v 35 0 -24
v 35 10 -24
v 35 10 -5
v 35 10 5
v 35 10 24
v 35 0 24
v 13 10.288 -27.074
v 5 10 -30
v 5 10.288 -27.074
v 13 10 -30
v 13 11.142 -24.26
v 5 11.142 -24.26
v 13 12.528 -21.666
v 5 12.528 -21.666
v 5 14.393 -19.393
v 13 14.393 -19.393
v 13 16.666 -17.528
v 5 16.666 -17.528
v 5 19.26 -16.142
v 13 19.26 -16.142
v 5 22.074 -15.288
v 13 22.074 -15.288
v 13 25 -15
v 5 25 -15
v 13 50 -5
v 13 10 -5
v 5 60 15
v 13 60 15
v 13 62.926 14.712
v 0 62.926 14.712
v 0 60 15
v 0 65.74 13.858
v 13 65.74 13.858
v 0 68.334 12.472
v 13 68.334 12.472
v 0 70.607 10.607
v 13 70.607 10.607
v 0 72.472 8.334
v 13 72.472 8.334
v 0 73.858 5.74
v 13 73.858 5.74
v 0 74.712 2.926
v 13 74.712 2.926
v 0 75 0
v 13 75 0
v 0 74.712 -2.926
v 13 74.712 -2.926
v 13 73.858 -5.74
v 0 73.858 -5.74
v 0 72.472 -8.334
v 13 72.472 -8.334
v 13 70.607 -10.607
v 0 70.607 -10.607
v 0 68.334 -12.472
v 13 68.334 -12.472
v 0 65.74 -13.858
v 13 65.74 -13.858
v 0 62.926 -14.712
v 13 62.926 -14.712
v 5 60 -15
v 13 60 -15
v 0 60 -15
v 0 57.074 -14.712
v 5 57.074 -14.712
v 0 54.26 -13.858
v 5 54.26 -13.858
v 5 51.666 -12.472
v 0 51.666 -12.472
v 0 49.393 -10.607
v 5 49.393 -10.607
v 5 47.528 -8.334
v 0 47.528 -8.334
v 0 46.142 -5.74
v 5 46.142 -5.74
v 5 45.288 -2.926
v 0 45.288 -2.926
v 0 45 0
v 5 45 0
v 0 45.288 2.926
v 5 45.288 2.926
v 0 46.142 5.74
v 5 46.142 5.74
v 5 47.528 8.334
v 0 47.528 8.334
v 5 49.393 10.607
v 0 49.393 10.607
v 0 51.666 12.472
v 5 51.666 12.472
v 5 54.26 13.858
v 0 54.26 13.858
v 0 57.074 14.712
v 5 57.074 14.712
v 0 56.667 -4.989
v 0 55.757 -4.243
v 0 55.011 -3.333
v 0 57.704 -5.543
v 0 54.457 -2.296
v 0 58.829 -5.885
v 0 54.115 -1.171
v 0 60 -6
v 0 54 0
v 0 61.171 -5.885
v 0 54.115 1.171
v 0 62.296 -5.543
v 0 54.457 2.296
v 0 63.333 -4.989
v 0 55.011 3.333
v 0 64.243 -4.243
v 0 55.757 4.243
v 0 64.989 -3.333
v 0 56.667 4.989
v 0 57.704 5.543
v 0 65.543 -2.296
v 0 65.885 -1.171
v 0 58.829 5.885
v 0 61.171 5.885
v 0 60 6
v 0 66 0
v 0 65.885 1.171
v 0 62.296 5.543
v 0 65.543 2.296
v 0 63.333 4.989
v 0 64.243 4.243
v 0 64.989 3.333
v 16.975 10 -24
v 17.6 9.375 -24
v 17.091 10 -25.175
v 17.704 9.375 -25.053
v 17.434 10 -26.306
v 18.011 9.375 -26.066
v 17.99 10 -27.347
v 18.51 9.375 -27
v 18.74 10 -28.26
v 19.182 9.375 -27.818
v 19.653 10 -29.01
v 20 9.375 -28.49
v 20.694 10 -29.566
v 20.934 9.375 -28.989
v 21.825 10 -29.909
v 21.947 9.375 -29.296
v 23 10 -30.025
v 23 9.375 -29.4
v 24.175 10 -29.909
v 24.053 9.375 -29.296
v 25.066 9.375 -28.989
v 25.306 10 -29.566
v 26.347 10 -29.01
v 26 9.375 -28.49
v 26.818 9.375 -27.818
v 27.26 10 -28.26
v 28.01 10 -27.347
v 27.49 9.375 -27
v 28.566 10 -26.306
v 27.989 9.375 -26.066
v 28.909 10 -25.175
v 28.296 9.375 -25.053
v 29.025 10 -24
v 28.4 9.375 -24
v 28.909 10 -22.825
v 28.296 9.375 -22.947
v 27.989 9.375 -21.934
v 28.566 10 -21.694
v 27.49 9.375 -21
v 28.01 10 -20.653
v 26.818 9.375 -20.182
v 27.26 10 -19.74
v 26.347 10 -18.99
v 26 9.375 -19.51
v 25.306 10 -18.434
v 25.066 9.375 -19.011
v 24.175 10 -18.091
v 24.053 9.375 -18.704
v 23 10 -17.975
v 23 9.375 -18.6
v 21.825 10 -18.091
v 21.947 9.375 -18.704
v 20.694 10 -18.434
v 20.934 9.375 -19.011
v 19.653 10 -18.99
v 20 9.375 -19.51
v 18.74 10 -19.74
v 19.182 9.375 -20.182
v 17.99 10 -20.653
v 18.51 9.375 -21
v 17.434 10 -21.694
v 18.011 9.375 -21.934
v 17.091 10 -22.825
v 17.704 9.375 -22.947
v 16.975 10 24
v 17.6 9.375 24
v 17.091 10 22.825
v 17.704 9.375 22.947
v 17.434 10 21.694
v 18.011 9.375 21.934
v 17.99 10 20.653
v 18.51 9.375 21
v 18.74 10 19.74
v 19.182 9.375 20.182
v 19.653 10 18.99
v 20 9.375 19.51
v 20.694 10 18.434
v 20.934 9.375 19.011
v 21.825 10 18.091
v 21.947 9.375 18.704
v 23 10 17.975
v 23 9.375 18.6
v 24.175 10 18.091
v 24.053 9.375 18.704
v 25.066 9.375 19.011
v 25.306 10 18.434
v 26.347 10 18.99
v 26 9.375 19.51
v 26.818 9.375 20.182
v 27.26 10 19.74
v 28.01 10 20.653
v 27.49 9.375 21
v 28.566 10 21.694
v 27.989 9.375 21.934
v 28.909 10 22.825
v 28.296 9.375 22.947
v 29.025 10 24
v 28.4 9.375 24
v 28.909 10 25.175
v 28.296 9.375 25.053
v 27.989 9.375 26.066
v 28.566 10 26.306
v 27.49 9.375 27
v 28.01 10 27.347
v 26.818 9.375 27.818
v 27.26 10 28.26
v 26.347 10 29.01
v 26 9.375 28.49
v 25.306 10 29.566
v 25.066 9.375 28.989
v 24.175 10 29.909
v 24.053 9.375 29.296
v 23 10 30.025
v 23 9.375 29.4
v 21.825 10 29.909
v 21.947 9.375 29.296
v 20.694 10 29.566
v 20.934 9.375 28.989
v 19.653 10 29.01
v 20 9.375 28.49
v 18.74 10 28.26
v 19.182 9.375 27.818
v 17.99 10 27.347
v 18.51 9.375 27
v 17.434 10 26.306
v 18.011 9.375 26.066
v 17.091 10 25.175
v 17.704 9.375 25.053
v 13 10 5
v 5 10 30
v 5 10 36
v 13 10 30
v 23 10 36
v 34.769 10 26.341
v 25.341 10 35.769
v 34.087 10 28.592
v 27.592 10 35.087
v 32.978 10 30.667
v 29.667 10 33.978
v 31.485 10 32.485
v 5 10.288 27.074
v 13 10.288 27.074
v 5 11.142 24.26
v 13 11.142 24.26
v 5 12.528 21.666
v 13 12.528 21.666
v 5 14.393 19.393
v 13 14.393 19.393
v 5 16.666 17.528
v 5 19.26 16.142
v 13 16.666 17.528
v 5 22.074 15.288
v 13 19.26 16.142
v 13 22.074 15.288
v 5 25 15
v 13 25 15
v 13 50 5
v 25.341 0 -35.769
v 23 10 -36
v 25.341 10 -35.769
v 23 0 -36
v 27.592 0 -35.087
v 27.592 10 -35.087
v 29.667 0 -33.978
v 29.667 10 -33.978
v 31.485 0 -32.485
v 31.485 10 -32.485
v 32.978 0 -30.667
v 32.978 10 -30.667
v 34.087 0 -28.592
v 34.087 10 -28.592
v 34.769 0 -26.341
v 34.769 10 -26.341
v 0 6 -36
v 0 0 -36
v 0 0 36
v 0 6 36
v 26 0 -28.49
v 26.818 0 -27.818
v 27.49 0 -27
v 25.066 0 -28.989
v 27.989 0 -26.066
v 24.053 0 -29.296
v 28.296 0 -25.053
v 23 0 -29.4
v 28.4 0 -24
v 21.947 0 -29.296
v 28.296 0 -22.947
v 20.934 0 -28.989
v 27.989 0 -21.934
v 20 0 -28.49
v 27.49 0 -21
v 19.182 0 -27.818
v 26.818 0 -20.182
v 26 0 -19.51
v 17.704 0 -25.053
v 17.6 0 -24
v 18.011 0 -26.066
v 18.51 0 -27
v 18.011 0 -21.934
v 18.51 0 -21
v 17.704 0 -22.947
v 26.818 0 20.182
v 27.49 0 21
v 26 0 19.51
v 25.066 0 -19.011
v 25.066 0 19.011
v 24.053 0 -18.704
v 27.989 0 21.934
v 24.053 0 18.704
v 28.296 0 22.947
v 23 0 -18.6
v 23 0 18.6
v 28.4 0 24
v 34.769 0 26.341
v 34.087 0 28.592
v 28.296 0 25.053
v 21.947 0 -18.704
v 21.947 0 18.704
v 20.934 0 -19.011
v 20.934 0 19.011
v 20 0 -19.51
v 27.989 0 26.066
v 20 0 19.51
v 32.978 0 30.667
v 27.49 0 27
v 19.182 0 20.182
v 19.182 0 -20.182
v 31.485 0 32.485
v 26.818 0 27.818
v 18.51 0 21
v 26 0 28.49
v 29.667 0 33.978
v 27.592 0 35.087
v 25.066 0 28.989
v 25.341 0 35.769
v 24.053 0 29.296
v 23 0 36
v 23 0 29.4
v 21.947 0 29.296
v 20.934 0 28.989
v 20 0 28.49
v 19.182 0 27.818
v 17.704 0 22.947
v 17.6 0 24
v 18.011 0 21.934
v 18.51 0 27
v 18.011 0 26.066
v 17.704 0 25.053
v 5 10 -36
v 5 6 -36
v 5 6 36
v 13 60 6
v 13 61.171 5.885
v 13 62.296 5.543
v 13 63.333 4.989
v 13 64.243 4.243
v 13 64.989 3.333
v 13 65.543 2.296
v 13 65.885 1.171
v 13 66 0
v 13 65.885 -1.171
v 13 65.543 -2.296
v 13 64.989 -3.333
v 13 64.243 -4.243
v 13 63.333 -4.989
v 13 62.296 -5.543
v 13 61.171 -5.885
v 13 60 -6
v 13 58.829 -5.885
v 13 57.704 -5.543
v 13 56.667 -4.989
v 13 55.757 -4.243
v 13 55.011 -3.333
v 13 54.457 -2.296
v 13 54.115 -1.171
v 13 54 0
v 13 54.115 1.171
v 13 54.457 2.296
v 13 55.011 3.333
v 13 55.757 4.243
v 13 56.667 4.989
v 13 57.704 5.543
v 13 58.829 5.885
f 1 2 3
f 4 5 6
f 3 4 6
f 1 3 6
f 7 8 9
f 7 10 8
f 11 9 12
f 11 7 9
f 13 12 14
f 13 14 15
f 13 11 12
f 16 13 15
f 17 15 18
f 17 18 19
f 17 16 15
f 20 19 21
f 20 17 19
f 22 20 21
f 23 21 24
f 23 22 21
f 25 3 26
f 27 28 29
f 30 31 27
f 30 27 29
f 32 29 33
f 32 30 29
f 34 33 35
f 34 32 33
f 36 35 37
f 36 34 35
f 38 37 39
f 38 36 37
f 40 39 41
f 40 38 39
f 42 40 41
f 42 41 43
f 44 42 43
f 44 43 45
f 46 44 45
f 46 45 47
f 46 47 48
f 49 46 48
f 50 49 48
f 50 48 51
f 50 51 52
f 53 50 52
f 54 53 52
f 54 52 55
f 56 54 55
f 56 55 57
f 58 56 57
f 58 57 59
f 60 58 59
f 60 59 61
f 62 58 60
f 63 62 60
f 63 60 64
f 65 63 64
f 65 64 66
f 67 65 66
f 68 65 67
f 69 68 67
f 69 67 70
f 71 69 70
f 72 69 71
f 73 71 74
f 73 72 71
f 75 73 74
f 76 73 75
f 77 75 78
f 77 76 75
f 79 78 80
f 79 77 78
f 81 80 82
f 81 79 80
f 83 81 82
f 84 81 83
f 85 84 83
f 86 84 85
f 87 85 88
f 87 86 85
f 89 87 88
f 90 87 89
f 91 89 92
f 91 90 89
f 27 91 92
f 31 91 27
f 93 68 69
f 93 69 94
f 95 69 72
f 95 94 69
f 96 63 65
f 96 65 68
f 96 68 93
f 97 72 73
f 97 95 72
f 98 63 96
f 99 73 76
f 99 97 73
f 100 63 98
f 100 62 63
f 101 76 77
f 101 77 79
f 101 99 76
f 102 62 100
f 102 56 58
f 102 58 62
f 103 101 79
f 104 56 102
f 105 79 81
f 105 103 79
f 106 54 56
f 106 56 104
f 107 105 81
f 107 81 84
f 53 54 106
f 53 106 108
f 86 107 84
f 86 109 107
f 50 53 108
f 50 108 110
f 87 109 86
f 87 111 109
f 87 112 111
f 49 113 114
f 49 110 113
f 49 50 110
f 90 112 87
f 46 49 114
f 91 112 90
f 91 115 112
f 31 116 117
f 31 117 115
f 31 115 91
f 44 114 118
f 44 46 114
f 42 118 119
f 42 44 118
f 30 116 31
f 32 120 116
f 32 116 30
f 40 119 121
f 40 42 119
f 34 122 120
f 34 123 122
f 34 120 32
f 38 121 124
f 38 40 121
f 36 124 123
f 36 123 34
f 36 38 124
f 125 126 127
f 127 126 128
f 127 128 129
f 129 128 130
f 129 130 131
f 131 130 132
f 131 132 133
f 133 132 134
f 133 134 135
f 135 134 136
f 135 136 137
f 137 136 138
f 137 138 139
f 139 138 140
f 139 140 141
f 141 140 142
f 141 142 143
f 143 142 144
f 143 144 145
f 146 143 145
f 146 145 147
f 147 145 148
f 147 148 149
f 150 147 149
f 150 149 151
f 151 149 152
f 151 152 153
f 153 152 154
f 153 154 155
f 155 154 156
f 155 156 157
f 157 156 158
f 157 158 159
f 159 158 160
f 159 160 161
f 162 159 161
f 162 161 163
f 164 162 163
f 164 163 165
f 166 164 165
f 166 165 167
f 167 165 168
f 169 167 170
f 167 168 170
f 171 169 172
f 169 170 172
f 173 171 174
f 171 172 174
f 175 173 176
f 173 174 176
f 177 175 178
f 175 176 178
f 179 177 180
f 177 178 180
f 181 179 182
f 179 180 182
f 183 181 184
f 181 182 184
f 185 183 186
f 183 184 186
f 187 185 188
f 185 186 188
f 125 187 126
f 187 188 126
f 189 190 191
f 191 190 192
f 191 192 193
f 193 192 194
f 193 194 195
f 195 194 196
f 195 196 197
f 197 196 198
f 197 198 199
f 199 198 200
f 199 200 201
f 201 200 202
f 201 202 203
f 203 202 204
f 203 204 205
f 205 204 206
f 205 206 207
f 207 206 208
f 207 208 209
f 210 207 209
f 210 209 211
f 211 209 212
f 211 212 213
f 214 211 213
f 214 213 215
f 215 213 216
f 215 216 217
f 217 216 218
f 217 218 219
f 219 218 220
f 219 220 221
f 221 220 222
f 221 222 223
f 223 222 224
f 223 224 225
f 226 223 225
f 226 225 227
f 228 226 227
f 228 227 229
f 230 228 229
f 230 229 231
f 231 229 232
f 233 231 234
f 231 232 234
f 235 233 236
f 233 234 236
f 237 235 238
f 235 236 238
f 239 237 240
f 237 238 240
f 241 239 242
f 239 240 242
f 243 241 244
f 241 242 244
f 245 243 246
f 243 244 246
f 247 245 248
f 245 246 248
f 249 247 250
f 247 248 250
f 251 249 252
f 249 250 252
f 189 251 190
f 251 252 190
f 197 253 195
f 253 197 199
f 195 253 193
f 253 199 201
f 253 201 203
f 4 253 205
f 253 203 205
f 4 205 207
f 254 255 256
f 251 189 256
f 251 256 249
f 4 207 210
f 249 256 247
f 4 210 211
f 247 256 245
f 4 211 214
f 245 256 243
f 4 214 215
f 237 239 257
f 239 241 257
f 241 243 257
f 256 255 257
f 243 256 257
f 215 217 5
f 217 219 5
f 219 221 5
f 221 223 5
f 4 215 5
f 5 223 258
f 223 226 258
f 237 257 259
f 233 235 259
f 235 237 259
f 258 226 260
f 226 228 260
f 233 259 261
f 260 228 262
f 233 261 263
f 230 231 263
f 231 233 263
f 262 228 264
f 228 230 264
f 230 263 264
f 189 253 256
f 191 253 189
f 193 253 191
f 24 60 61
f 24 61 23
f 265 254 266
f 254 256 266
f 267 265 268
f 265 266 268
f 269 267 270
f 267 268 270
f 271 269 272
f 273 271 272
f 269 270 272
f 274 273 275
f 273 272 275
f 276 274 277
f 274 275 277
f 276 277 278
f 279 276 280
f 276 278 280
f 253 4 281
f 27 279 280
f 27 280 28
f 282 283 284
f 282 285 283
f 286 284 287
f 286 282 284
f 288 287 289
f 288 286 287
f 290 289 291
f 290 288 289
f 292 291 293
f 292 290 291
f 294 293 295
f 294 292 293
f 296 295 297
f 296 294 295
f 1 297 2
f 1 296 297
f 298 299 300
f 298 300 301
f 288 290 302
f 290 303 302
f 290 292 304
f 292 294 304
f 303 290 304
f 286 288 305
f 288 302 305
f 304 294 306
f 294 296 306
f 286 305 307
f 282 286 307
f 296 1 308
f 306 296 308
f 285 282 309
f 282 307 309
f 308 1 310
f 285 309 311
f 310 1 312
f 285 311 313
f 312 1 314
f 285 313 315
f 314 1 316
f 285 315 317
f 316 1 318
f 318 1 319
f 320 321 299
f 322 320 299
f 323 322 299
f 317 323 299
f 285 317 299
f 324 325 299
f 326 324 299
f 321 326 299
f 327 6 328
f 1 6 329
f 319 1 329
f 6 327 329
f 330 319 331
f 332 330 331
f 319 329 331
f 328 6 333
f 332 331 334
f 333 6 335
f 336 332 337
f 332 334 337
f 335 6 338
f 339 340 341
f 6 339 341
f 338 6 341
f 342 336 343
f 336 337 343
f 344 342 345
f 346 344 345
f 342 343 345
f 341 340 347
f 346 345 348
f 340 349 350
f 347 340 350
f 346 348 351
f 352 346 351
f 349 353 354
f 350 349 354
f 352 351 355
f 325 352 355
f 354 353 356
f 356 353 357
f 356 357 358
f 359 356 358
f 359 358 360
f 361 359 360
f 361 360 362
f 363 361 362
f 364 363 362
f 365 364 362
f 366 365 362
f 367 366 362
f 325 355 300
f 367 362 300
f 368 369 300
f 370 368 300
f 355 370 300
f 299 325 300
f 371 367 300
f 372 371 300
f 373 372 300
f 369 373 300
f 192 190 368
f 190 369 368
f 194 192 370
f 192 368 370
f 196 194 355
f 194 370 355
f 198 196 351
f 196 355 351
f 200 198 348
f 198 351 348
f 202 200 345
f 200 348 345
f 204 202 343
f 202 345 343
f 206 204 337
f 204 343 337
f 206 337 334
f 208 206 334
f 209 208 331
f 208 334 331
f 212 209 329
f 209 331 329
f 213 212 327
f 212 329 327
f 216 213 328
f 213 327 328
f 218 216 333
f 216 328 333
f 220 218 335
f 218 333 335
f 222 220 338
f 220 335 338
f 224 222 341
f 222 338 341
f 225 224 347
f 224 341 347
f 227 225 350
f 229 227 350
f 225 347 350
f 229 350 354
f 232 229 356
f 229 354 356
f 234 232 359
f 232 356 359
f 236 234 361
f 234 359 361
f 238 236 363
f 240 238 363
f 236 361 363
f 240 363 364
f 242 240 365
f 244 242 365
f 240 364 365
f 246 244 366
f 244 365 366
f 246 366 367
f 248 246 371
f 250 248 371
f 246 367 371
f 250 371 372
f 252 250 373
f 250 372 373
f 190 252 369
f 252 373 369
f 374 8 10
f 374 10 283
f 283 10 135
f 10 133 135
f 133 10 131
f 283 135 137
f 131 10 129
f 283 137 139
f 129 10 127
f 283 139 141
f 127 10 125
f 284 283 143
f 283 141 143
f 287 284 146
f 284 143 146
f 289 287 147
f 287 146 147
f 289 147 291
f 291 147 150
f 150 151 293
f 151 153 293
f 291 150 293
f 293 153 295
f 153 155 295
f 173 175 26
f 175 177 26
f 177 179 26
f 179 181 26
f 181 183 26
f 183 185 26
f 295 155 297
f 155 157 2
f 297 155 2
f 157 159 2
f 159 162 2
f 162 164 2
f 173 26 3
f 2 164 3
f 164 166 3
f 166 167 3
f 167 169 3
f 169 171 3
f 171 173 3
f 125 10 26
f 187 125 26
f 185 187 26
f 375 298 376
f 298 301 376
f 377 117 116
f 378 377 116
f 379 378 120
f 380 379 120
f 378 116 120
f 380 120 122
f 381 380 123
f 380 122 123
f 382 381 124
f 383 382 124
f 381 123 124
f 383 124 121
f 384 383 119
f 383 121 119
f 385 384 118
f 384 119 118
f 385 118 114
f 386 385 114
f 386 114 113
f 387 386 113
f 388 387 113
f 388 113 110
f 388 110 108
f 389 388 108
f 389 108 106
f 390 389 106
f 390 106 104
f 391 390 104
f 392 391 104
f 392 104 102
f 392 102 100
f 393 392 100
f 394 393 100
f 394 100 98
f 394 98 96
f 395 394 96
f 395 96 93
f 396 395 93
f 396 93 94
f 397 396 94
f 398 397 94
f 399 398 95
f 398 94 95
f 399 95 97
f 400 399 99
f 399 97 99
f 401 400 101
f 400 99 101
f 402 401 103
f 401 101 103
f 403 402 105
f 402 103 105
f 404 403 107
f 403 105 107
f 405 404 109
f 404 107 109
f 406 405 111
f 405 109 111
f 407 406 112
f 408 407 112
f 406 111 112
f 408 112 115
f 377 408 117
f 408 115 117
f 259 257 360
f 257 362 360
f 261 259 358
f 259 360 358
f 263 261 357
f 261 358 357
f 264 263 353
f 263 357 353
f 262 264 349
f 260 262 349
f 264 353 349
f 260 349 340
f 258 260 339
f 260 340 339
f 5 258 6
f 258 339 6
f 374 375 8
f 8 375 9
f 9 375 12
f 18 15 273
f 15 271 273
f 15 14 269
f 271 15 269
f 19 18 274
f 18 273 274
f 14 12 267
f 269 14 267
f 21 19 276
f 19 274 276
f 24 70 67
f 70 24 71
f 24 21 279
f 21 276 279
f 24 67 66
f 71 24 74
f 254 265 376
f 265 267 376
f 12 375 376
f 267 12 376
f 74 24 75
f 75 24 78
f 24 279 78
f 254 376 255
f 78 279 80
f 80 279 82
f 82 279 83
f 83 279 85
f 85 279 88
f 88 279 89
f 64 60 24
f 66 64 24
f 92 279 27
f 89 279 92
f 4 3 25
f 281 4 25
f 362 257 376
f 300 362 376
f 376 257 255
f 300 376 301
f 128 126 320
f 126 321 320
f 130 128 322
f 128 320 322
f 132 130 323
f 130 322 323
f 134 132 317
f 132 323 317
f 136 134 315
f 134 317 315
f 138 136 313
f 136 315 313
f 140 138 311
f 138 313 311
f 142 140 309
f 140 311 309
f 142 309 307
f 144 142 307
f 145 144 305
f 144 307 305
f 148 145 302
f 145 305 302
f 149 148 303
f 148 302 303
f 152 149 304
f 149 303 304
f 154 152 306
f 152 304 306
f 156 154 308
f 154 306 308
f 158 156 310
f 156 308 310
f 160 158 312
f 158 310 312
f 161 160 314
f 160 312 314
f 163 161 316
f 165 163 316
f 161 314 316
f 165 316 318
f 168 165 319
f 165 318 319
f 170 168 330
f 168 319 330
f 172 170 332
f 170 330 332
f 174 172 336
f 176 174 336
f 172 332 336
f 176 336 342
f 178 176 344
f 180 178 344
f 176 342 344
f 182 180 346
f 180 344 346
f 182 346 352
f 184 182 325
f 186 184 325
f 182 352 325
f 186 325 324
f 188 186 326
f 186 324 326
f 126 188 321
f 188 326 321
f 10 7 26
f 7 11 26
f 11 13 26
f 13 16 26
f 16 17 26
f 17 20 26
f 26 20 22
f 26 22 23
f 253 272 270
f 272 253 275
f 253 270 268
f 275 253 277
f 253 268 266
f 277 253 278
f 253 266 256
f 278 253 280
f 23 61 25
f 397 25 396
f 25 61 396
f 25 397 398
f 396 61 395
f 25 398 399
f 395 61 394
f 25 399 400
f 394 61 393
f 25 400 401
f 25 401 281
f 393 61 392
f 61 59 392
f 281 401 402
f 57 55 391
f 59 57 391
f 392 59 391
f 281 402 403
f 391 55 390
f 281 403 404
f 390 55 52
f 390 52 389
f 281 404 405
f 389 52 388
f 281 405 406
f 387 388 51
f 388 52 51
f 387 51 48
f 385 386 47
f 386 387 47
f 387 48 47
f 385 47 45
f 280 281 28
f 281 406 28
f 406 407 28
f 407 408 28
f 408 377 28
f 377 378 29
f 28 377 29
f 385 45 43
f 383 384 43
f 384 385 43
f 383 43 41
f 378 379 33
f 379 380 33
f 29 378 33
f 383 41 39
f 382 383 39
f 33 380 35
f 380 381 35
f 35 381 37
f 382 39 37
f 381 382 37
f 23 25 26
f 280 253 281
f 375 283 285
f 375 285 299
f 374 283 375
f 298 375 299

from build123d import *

# Parameters (mm, degrees)
BOSS_EXTRUDE1_DEPTH               = 36
BOSS_EXTRUDE2_DEPTH               = 8
FILLET1_R                         = 15
BOSS_EXTRUDE3_START               = 5
SKETCH3_R                         = 15
BOSS_EXTRUDE3_DEPTH               = 5
HOLE1_D                           = 12
HOLE1_DEPTH                       = 27.75
FILLET2_R                         = 12
M12X1_25_TAPPED_HOLE1_D           = 10.8
M12X1_25_TAPPED_HOLE1_DEPTH       = 24.505352657
M12X1_25_TAPPED_HOLE1_CSINK_D     = 12.05
M12X1_25_TAPPED_HOLE1_CSINK_ANGLE = 90
M12X1_25_TAPPED_HOLE1_TIP         = 3.244647343
RIB1_REACH                        = 92.255
SKETCH8_WALL_W                    = 228.161236354
SKETCH8_WALL_H                    = 10


with BuildPart() as part:
    # Sketch1 → Boss-Extrude1 (new, symmetric)
    with BuildSketch(Plane.XY):
        Polygon((0, 0), (0, 6), (5, 6), (5, 10), (35, 10), (35, 0), align=None)
    extrude(amount=BOSS_EXTRUDE1_DEPTH, both=True)

    # Sketch2 → Boss-Extrude2 (add)
    with BuildSketch(Plane.ZY.offset(-5)):
        with BuildLine():
            Line((-15, 60), (-15, 10))
            Line((-15, 10), (15, 10))
            Line((15, 10), (15, 60))
            ThreePointArc((15, 60), (0, 75), (-15, 60))
        make_face()
    extrude(amount=-BOSS_EXTRUDE2_DEPTH)

    # Fillet1
    fillet1_edges = [part.edges().sort_by_distance(p)[0] for p in [
        (9, 10, 15),
        (9, 10, -15),
    ]]
    fillet(fillet1_edges, radius=FILLET1_R)

    # Sketch3 → Boss-Extrude3 (add)
    with BuildSketch(Plane.ZY.offset(-5).offset(BOSS_EXTRUDE3_START)):
        with Locations((0, 60)):
            Circle(SKETCH3_R)
    extrude(amount=-BOSS_EXTRUDE3_DEPTH)

    # Hole1
    with Locations(Plane(origin=(13, 0, 0), x_dir=(0, 0, -1), z_dir=(1, 0, 0))):
        with Locations((0, 60)):
            Hole(HOLE1_D / 2, depth=HOLE1_DEPTH)

    # Fillet2
    fillet2_edges = [part.edges().sort_by_distance(p)[0] for p in [
        (35, 5, -36),
        (35, 5, 36),
    ]]
    fillet(fillet2_edges, radius=FILLET2_R)

    # M12x1.25 Tapped Hole1
    with Locations(Plane(origin=(0, 10, 0), x_dir=(1, 0, 0), z_dir=(0, 1, 0))):
        with Locations((23, -24), (23, 24)):
            CounterSinkHole(M12X1_25_TAPPED_HOLE1_D / 2, M12X1_25_TAPPED_HOLE1_CSINK_D / 2, depth=M12X1_25_TAPPED_HOLE1_DEPTH, counter_sink_angle=M12X1_25_TAPPED_HOLE1_CSINK_ANGLE)
            with Locations((0, 0, -(M12X1_25_TAPPED_HOLE1_DEPTH + M12X1_25_TAPPED_HOLE1_TIP / 2))):  # 118° drill point
                Cone(0, M12X1_25_TAPPED_HOLE1_D / 2, M12X1_25_TAPPED_HOLE1_TIP, mode=Mode.SUBTRACT)

    # Sketch8 wall → Rib1 (add, up to next)
    with BuildSketch(Plane(origin=(24, 30, 0), x_dir=(-0.481918749772, 0.876215908677, 0), z_dir=(-0.876215908677, -0.481918749772, 0)), mode=Mode.PRIVATE) as rib1_sk1:
        Rectangle(SKETCH8_WALL_W, SKETCH8_WALL_H)
    rib1_tool1 = extrude(rib1_sk1.sketch, amount=RIB1_REACH, mode=Mode.PRIVATE) - part.part
    add(rib1_tool1.solids().sort_by_distance((24, 30, 0))[0])


solid = part.part
